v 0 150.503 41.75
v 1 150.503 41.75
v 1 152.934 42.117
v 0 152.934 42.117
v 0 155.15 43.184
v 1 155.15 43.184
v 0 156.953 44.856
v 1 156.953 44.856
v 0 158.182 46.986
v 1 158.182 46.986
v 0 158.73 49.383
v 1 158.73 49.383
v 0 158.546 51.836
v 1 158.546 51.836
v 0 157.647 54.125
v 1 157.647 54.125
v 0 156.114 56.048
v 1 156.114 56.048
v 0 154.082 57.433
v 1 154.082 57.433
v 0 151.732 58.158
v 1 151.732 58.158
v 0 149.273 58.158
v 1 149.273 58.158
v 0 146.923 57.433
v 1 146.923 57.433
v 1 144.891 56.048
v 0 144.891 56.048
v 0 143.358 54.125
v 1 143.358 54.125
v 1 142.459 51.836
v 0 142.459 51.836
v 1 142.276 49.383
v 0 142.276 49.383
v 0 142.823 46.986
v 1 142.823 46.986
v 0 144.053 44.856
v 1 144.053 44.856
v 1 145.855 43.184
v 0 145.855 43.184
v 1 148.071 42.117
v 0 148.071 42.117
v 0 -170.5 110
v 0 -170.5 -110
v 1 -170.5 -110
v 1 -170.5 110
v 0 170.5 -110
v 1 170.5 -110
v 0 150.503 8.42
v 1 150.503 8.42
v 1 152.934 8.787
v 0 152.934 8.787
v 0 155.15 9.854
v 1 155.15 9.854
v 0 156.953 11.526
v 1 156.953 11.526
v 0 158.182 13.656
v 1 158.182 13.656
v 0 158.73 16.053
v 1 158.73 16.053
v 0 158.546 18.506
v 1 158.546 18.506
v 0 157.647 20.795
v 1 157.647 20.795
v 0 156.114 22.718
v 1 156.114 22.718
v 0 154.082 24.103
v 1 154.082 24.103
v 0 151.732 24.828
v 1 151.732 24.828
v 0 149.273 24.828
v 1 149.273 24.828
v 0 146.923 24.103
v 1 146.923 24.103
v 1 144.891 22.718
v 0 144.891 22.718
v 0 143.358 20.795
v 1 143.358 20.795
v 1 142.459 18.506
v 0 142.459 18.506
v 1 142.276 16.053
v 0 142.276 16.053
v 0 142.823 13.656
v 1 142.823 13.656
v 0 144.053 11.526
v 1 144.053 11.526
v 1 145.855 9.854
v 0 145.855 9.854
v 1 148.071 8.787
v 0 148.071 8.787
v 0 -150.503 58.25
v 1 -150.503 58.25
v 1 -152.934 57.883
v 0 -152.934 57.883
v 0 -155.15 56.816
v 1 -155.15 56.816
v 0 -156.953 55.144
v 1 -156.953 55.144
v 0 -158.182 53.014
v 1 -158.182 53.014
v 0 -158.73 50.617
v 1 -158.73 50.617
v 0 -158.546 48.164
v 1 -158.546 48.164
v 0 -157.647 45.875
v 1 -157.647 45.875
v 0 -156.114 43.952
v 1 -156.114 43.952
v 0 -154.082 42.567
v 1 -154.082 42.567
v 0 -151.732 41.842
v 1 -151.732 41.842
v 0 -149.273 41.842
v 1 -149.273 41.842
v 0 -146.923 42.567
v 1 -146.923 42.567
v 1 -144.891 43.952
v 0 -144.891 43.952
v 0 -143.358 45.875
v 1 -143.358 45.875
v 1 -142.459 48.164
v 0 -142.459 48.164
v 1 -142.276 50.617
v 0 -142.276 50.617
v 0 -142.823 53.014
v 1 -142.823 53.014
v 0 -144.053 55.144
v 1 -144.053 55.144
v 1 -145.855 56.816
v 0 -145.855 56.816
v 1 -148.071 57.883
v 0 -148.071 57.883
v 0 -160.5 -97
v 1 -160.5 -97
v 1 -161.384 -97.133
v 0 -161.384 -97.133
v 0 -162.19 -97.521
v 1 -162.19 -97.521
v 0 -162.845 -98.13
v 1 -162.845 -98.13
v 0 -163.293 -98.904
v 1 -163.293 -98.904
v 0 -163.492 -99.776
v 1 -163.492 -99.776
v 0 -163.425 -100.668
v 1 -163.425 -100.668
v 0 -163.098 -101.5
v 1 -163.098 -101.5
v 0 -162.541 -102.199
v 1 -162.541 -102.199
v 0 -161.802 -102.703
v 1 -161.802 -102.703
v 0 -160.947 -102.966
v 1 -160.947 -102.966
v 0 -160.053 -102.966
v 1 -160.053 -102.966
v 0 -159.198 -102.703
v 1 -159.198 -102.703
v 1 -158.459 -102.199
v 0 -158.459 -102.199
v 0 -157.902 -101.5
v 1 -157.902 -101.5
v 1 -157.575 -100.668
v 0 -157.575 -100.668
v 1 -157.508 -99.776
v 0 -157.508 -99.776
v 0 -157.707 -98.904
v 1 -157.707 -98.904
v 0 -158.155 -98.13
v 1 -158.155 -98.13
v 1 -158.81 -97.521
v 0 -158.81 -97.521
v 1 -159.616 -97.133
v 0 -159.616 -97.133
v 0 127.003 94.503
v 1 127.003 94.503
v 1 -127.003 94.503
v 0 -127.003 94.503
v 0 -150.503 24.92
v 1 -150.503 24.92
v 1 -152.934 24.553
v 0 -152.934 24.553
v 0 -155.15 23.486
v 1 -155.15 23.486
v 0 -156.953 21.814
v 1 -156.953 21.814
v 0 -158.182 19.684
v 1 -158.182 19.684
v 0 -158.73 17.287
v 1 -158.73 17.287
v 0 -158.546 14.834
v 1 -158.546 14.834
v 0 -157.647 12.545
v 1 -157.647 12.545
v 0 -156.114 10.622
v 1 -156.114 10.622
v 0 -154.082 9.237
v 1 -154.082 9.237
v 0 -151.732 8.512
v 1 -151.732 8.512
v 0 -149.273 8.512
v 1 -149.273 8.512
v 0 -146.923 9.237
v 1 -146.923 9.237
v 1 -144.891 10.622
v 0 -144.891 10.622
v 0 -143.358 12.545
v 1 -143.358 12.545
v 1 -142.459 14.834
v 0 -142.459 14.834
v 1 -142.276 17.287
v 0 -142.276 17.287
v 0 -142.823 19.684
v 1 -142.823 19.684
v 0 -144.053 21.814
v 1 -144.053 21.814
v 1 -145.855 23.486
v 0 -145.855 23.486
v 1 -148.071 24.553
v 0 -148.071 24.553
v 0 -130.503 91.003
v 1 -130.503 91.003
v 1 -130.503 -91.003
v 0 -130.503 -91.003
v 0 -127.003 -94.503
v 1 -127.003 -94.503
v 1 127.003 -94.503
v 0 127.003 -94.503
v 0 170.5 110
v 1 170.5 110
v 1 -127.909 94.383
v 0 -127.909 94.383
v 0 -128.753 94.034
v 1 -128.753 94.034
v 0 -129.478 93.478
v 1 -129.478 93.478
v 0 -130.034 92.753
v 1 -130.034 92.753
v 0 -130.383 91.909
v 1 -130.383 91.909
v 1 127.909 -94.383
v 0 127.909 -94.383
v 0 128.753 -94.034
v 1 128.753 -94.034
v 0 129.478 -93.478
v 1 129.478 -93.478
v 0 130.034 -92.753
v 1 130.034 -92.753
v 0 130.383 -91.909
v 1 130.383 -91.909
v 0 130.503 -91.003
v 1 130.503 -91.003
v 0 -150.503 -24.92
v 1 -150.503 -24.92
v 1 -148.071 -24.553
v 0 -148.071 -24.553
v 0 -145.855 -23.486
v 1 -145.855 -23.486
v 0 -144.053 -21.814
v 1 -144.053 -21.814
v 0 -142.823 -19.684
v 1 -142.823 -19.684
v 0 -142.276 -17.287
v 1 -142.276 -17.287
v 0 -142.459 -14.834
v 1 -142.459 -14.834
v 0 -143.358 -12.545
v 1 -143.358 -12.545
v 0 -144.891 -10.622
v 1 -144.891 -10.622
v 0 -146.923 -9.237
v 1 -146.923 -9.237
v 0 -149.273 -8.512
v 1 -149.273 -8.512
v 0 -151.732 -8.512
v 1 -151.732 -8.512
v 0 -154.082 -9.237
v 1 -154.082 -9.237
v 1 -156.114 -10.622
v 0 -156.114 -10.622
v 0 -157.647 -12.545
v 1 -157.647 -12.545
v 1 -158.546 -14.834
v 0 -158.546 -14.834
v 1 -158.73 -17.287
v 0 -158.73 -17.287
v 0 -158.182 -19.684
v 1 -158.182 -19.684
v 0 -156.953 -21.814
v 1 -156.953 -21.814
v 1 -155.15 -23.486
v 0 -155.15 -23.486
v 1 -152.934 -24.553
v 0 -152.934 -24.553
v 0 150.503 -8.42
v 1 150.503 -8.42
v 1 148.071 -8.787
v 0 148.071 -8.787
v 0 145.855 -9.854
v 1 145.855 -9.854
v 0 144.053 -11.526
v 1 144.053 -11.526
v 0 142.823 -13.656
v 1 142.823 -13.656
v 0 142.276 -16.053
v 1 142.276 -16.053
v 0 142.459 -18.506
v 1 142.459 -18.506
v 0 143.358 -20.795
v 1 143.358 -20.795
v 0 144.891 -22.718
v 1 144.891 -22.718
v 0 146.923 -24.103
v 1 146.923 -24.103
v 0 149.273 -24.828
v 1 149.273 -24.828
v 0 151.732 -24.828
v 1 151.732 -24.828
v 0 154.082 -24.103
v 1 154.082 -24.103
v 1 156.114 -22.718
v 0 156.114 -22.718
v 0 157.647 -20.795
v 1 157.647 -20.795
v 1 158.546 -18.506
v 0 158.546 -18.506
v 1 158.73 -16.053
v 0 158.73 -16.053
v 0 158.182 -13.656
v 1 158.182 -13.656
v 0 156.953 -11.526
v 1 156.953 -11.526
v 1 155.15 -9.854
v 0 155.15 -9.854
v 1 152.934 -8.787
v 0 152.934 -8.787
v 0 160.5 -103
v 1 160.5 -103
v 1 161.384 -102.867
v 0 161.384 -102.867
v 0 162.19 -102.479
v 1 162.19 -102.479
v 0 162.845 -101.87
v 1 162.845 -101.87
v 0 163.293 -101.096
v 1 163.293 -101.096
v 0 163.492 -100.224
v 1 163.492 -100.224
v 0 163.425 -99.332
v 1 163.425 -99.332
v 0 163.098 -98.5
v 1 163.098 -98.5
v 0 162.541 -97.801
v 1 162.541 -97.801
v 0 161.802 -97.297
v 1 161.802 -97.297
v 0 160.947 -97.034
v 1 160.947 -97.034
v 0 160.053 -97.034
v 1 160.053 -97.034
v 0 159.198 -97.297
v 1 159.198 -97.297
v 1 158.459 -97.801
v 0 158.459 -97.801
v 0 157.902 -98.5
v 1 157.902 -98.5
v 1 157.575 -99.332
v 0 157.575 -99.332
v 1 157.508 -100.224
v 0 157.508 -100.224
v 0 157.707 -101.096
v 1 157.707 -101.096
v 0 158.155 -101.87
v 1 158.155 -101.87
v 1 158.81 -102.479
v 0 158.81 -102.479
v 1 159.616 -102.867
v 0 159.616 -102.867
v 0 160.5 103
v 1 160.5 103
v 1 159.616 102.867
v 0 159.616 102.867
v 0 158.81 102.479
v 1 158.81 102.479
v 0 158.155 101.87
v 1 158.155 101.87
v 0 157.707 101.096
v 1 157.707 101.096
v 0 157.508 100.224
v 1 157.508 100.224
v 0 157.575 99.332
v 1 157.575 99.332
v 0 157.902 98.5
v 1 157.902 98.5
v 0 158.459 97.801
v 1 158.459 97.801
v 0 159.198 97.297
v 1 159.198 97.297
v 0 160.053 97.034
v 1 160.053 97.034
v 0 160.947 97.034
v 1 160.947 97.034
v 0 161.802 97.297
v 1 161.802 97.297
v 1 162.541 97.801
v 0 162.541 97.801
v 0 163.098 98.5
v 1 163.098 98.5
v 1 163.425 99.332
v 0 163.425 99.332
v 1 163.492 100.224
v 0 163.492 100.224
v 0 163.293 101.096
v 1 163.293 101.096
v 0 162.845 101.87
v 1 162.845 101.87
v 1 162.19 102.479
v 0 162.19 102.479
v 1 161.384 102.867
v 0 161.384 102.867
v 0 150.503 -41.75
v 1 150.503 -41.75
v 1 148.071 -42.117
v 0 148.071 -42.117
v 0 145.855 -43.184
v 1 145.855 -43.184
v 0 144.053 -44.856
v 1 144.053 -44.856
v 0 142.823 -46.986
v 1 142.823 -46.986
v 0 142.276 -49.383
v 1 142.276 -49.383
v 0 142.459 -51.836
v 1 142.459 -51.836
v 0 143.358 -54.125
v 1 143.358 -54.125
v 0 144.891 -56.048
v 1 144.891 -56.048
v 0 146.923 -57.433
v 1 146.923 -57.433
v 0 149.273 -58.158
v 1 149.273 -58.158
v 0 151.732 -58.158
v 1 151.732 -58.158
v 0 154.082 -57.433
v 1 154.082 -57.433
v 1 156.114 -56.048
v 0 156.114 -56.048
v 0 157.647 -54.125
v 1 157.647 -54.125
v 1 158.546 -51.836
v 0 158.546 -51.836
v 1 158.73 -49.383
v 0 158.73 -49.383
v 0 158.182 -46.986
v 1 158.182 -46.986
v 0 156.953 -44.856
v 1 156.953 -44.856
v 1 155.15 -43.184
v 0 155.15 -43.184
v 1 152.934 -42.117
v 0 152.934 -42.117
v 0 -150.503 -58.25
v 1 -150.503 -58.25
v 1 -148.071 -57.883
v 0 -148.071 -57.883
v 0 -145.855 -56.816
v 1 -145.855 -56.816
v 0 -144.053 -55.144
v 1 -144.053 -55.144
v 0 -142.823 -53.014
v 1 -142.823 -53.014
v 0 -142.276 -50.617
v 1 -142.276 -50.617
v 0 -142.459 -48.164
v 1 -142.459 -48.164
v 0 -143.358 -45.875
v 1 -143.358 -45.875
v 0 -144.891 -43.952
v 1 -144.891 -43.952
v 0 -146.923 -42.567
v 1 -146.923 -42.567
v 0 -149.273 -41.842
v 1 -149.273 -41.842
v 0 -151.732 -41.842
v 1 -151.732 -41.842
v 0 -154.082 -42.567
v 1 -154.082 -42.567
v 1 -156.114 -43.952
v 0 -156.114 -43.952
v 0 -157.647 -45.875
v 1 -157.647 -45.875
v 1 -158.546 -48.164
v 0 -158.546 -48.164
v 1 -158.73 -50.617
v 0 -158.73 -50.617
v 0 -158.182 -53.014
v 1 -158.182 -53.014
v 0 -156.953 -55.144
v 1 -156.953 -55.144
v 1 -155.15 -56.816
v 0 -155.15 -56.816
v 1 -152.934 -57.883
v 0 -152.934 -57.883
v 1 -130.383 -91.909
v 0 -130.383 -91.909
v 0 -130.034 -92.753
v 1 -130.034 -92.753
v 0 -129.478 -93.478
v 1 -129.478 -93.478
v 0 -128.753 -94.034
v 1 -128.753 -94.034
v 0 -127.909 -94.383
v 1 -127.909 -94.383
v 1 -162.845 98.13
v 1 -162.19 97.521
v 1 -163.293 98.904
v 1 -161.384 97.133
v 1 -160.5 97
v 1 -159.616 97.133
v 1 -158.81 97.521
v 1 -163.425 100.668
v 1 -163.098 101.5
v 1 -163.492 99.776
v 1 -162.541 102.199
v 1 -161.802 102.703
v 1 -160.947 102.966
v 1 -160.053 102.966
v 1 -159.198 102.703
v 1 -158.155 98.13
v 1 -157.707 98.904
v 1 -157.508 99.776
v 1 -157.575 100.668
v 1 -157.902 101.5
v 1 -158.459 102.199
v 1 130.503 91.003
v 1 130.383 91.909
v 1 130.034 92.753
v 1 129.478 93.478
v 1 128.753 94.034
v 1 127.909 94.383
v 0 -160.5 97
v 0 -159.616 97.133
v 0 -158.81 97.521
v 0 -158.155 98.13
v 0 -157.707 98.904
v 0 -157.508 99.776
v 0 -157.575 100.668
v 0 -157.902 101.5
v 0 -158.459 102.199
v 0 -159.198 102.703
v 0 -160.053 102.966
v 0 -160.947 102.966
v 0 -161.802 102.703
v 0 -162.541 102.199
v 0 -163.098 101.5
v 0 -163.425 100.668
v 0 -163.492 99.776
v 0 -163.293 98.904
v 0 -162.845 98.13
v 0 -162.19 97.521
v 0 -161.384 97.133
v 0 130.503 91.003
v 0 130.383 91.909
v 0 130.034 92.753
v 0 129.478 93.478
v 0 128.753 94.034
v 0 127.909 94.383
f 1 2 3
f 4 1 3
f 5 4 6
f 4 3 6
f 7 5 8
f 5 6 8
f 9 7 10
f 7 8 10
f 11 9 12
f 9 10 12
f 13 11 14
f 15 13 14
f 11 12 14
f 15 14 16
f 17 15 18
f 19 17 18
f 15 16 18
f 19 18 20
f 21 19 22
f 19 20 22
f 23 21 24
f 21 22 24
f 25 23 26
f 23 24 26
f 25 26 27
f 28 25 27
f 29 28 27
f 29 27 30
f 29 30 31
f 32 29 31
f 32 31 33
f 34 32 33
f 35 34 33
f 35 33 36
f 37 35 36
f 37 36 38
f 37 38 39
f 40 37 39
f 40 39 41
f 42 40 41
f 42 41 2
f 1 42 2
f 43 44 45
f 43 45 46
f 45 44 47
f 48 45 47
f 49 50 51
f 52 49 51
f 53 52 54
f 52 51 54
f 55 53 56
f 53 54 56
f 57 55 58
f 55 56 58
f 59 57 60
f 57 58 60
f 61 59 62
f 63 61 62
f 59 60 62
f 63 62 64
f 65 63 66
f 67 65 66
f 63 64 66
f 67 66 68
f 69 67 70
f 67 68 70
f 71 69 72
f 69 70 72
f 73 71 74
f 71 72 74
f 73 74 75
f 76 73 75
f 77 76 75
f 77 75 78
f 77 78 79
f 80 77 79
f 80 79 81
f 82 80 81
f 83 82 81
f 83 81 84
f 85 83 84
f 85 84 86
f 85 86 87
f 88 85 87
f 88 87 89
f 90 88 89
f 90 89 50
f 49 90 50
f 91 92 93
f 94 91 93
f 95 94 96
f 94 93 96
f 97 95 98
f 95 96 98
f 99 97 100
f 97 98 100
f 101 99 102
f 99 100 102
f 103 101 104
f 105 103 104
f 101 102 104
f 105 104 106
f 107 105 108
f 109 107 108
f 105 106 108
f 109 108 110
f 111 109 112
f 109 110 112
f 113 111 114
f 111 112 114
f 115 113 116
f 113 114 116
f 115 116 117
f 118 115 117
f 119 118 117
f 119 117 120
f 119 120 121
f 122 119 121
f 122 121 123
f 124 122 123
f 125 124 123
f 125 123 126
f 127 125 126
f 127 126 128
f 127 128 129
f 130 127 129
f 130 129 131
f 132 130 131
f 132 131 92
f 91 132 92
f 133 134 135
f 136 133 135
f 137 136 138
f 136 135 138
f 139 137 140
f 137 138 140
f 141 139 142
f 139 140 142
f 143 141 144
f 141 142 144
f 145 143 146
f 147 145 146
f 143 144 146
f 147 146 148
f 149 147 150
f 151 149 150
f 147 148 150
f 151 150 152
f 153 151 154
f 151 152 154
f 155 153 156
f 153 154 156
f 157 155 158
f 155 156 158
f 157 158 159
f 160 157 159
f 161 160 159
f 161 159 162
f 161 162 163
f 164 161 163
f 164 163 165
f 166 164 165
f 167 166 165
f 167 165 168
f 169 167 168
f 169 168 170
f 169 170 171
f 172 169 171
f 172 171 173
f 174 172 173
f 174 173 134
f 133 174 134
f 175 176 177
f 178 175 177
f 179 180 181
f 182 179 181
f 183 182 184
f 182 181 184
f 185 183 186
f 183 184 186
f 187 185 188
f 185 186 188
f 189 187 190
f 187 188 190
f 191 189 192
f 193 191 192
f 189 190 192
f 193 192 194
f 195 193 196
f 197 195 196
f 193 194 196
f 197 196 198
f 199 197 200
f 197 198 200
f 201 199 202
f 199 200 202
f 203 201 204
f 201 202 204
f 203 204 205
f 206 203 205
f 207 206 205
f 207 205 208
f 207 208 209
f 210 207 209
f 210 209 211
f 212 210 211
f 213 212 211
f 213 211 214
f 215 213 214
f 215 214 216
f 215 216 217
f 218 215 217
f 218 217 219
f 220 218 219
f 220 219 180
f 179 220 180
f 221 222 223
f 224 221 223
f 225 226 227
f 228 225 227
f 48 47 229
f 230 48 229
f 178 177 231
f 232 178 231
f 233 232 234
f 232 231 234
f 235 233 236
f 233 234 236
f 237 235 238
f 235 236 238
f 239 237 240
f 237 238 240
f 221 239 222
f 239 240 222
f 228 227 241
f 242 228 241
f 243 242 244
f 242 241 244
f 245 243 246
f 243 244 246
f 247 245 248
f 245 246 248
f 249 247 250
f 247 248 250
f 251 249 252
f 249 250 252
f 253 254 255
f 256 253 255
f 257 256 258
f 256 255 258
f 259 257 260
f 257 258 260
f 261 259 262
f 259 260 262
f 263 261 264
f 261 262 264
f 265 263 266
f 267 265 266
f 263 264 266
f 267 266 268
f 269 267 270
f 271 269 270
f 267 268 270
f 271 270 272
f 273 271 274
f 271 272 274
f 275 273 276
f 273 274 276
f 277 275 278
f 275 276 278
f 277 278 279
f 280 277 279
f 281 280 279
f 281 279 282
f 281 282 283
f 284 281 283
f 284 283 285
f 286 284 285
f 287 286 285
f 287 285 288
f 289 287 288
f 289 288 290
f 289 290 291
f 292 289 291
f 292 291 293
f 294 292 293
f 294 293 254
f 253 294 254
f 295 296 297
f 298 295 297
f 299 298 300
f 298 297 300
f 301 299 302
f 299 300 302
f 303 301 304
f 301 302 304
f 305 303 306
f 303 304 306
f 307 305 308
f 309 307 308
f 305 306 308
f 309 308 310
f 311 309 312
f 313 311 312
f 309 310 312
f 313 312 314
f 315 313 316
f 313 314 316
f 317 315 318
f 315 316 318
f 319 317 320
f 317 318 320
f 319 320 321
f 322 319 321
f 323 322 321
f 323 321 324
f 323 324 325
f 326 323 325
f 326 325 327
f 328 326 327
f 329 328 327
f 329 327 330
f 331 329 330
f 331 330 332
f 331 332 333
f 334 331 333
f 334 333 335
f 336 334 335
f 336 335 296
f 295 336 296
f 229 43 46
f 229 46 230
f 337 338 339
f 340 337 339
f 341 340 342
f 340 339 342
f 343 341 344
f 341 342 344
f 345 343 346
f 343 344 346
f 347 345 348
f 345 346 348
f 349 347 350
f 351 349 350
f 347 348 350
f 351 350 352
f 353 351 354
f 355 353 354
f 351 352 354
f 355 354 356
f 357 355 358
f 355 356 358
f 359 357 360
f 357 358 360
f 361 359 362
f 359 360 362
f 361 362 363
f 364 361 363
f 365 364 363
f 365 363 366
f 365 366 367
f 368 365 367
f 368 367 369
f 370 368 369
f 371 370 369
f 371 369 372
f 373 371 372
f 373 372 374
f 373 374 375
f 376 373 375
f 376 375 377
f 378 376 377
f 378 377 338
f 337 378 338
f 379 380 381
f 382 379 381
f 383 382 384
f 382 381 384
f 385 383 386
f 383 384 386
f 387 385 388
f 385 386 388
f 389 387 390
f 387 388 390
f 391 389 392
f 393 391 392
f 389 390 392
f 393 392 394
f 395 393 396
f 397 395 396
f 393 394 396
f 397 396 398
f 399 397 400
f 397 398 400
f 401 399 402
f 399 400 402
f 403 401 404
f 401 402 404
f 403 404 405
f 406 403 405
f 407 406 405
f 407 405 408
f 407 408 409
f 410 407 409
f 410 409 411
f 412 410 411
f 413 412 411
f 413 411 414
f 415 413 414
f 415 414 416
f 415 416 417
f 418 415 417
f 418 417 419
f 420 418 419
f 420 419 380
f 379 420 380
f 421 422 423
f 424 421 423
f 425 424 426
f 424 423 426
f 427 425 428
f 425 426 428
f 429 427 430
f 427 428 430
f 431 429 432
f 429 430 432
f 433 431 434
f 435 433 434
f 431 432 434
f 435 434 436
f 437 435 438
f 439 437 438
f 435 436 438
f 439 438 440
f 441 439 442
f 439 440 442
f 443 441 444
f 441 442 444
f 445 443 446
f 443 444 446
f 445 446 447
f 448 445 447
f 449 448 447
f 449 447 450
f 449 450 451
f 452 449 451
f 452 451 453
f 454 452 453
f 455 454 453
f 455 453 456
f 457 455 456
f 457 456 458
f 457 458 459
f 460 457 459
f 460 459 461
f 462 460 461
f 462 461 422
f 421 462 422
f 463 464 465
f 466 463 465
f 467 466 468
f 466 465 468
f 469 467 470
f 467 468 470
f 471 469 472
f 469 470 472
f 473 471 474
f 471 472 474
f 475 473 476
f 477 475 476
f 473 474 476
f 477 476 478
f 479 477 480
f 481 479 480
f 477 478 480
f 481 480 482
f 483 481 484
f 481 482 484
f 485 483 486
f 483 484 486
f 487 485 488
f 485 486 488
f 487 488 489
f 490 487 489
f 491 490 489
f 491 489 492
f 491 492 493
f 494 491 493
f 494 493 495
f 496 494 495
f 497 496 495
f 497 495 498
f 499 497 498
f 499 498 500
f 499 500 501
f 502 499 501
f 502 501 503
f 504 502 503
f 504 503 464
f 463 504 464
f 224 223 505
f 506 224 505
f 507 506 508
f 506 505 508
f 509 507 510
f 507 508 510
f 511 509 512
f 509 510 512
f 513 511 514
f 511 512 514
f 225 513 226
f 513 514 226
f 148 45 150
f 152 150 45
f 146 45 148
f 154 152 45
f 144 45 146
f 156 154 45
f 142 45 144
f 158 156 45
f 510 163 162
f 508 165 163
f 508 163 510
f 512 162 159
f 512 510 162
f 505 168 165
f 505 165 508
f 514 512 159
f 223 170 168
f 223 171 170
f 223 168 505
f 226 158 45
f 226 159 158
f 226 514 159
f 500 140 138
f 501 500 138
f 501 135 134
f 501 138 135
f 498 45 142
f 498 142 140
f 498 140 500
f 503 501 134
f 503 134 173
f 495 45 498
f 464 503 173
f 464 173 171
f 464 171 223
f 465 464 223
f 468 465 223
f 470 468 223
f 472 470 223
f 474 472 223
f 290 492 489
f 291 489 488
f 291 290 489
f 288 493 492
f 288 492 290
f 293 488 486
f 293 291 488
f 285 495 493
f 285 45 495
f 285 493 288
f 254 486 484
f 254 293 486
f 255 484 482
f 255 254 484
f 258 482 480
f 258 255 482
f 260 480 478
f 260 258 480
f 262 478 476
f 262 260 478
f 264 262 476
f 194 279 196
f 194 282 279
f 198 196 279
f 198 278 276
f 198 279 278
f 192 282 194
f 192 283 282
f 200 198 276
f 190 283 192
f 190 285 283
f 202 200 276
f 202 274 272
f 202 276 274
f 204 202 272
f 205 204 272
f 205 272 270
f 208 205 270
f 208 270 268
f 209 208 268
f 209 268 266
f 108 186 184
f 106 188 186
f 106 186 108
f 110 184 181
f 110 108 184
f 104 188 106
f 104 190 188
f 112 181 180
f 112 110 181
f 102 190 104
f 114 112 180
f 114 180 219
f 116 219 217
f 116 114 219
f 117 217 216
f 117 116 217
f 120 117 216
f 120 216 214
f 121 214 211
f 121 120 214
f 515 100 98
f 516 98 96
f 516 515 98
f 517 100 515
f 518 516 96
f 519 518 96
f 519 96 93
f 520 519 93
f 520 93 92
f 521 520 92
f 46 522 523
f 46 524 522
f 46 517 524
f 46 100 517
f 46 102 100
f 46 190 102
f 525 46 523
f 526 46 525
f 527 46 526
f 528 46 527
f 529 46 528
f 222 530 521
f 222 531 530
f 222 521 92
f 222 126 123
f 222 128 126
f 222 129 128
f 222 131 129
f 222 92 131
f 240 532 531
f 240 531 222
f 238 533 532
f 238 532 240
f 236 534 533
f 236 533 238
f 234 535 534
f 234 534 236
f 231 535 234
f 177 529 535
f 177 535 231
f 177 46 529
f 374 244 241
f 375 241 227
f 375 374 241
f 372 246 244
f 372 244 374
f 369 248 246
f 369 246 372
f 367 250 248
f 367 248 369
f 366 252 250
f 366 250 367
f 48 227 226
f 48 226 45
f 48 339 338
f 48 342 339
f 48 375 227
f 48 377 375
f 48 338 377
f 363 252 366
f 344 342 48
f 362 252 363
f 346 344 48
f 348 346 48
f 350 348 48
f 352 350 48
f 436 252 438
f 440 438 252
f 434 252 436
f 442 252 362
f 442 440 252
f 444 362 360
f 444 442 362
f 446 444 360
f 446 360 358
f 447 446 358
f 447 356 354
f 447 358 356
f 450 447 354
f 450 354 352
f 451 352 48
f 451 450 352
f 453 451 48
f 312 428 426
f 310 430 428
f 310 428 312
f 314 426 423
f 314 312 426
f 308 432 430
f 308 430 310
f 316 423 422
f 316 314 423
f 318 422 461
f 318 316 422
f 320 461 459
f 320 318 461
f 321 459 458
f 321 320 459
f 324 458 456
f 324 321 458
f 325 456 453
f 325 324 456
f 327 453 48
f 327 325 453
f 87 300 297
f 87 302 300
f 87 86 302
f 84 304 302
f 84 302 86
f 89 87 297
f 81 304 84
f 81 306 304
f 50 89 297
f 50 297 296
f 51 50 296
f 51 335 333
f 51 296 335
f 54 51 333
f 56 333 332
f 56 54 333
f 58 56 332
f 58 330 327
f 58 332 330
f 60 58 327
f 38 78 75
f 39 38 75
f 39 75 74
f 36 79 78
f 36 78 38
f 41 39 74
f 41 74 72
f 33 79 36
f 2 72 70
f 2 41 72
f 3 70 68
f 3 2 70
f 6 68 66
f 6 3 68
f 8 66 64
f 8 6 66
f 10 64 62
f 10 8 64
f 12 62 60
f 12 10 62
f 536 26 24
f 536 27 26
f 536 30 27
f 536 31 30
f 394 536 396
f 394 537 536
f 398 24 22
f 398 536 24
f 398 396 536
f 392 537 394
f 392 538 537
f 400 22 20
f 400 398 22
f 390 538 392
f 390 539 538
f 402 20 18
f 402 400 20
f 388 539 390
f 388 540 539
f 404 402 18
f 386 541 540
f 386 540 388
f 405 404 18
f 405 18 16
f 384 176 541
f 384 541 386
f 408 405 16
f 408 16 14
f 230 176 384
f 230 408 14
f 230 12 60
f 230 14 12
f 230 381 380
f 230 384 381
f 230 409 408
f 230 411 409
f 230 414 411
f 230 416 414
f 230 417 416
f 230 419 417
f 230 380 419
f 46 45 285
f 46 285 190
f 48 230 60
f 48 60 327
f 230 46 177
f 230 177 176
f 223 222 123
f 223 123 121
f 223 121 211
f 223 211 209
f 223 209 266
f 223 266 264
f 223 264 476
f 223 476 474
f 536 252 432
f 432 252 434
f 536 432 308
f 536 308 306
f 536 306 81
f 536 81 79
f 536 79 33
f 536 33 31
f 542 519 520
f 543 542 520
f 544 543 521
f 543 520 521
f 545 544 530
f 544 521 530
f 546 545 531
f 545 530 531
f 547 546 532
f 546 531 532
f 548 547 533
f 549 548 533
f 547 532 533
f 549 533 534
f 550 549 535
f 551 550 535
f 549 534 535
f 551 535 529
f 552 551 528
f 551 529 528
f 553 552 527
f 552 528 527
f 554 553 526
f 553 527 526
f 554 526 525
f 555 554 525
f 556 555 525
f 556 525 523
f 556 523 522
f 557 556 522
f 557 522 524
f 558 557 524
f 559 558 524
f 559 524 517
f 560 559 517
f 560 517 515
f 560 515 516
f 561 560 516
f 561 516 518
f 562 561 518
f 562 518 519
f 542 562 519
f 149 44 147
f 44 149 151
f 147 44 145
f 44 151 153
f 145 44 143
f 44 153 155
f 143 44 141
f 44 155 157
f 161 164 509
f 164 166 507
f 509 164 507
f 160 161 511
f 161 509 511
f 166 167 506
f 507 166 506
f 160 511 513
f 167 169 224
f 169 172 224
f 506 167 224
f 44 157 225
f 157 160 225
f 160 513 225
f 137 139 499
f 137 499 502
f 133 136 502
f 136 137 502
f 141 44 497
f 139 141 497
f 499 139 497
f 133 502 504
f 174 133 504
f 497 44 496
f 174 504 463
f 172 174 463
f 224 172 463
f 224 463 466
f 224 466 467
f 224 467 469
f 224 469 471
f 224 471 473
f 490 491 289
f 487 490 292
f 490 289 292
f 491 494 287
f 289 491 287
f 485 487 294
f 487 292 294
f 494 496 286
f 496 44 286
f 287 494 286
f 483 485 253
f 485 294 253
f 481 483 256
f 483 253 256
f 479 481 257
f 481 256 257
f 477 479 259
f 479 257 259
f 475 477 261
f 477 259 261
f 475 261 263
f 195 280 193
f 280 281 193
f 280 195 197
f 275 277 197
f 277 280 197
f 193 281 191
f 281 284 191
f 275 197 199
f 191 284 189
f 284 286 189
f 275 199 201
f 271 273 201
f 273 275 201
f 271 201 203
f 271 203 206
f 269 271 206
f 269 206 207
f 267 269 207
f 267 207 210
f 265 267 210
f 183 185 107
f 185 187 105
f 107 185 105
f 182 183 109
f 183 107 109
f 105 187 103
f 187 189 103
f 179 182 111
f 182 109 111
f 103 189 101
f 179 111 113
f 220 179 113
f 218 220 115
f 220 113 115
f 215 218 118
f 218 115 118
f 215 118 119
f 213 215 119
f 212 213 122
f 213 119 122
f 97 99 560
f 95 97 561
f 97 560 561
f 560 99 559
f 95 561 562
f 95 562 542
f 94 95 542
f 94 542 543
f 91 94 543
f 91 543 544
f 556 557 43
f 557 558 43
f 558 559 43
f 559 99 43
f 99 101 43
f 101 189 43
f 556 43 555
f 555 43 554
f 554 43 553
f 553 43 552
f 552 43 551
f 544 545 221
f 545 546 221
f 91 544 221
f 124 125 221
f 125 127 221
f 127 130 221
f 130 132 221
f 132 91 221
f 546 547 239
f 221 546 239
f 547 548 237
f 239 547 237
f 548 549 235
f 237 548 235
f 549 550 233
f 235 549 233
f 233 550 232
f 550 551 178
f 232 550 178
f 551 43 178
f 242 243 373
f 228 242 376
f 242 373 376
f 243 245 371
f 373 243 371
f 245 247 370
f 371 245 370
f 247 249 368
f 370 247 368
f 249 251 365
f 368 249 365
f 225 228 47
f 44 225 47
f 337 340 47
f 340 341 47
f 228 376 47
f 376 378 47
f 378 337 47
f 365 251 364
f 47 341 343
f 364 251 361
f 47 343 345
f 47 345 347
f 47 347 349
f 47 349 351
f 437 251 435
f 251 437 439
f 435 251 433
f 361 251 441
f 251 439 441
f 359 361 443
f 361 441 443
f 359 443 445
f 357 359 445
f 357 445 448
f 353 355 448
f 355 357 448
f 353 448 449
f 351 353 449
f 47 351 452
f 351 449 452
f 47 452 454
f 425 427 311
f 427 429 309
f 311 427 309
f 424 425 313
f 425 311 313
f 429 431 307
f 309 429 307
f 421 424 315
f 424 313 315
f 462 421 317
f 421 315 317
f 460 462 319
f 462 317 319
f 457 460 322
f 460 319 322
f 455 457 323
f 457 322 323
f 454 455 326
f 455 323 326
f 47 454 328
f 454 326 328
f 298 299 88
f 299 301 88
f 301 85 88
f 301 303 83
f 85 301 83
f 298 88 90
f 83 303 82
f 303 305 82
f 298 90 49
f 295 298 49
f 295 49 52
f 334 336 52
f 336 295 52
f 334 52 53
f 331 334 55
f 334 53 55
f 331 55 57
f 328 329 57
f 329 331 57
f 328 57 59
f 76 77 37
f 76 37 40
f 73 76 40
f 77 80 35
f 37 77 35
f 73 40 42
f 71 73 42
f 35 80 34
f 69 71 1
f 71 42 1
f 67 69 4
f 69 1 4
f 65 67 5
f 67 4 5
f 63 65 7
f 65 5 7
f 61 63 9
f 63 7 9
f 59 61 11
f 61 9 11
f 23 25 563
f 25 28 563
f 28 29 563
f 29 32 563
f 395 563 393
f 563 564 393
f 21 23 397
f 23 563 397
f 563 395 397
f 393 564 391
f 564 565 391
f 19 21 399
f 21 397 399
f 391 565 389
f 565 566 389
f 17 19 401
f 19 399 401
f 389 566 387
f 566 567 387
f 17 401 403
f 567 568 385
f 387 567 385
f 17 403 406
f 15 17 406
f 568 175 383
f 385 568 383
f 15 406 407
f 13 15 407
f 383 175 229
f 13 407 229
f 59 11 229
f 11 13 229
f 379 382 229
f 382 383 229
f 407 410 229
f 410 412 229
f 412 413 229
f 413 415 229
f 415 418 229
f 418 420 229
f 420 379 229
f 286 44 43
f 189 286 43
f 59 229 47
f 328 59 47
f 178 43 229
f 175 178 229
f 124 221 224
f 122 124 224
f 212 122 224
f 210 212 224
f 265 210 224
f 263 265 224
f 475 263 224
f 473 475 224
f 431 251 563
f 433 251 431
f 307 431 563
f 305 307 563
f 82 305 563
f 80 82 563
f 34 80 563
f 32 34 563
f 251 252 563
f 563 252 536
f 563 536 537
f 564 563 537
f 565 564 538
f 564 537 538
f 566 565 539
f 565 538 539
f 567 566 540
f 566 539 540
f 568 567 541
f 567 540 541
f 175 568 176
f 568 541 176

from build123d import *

# Parameters (mm, degrees)
SKETCH1_W           = 341
SKETCH1_H           = 220
BOSS_EXTRUDE1_DEPTH = 1
SKETCH2_R           = 8.25
CUT_EXTRUDE1_DEPTH  = 203.906998401
SKETCH3_R           = 3
CUT_EXTRUDE2_DEPTH  = 203.906998401


with BuildPart() as part:
    # Sketch1 → Boss-Extrude1 (new body)
    with BuildSketch(Plane.YZ):
        Rectangle(SKETCH1_W, SKETCH1_H)
    extrude(amount=BOSS_EXTRUDE1_DEPTH)

    # Sketch2 → Cut-Extrude1 (cut, through all)
    with BuildSketch(Plane.YZ.offset(1)):
        with Locations(Location((150.50261802, 50, 0), (0, 0, 270))):
            Circle(SKETCH2_R)
        with Locations(Location((150.50261802, 16.67, 0), (0, 0, 270))):
            Circle(SKETCH2_R)
        with Locations(Location((150.50261802, -16.67, 0), (0, 0, 90))):
            Circle(SKETCH2_R)
        with Locations(Location((150.50261802, -50, 0), (0, 0, 90))):
            Circle(SKETCH2_R)
        with Locations(Location((-150.50261802, -50, 0), (0, 0, 270))):
            Circle(SKETCH2_R)
        with Locations(Location((-150.50261802, -16.67, 0), (0, 0, 270))):
            Circle(SKETCH2_R)
        with Locations(Location((-150.50261802, 16.67, 0), (0, 0, 90))):
            Circle(SKETCH2_R)
        with Locations(Location((-150.50261802, 50, 0), (0, 0, 90))):
            Circle(SKETCH2_R)
        with BuildLine():
            Line((-130.50261802, 91.002659242), (-130.502618018, -91.002659141))
            ThreePointArc((-130.502618018, -91.002659141), (-129.477508731, -93.477508839), (-127.002658987, -94.502618015))
            Line((-127.002658987, -94.502618015), (127.002659141, -94.502618018))
            ThreePointArc((127.002659141, -94.502618018), (129.477508787, -93.477508786), (130.50261802, -91.002659141))
            Line((130.50261802, -91.002659141), (130.502618017, 91.002659141))
            ThreePointArc((130.502618017, 91.002659141), (129.477508731, 93.477508839), (127.002658987, 94.502618015))
            Line((127.002658987, 94.502618015), (-127.00265914, 94.502618018))
            ThreePointArc((-127.00265914, 94.502618018), (-129.477508751, 93.477508822), (-130.50261802, 91.002659242))
        make_face()
    extrude(amount=-CUT_EXTRUDE1_DEPTH, mode=Mode.SUBTRACT)

    # Sketch3 → Cut-Extrude2 (cut, through all)
    with BuildSketch(Plane.YZ.offset(1)):
        with Locations(Location((-160.5, 100, 0), (0, 0, 270))):
            Circle(SKETCH3_R)
        with Locations(Location((160.5, 100, 0), (0, 0, 90))):
            Circle(SKETCH3_R)
        with Locations(Location((-160.5, -100, 0), (0, 0, 90))):
            Circle(SKETCH3_R)
        with Locations(Location((160.5, -100, 0), (0, 0, 270))):
            Circle(SKETCH3_R)
    extrude(amount=-CUT_EXTRUDE2_DEPTH, mode=Mode.SUBTRACT)


solid = part.part
